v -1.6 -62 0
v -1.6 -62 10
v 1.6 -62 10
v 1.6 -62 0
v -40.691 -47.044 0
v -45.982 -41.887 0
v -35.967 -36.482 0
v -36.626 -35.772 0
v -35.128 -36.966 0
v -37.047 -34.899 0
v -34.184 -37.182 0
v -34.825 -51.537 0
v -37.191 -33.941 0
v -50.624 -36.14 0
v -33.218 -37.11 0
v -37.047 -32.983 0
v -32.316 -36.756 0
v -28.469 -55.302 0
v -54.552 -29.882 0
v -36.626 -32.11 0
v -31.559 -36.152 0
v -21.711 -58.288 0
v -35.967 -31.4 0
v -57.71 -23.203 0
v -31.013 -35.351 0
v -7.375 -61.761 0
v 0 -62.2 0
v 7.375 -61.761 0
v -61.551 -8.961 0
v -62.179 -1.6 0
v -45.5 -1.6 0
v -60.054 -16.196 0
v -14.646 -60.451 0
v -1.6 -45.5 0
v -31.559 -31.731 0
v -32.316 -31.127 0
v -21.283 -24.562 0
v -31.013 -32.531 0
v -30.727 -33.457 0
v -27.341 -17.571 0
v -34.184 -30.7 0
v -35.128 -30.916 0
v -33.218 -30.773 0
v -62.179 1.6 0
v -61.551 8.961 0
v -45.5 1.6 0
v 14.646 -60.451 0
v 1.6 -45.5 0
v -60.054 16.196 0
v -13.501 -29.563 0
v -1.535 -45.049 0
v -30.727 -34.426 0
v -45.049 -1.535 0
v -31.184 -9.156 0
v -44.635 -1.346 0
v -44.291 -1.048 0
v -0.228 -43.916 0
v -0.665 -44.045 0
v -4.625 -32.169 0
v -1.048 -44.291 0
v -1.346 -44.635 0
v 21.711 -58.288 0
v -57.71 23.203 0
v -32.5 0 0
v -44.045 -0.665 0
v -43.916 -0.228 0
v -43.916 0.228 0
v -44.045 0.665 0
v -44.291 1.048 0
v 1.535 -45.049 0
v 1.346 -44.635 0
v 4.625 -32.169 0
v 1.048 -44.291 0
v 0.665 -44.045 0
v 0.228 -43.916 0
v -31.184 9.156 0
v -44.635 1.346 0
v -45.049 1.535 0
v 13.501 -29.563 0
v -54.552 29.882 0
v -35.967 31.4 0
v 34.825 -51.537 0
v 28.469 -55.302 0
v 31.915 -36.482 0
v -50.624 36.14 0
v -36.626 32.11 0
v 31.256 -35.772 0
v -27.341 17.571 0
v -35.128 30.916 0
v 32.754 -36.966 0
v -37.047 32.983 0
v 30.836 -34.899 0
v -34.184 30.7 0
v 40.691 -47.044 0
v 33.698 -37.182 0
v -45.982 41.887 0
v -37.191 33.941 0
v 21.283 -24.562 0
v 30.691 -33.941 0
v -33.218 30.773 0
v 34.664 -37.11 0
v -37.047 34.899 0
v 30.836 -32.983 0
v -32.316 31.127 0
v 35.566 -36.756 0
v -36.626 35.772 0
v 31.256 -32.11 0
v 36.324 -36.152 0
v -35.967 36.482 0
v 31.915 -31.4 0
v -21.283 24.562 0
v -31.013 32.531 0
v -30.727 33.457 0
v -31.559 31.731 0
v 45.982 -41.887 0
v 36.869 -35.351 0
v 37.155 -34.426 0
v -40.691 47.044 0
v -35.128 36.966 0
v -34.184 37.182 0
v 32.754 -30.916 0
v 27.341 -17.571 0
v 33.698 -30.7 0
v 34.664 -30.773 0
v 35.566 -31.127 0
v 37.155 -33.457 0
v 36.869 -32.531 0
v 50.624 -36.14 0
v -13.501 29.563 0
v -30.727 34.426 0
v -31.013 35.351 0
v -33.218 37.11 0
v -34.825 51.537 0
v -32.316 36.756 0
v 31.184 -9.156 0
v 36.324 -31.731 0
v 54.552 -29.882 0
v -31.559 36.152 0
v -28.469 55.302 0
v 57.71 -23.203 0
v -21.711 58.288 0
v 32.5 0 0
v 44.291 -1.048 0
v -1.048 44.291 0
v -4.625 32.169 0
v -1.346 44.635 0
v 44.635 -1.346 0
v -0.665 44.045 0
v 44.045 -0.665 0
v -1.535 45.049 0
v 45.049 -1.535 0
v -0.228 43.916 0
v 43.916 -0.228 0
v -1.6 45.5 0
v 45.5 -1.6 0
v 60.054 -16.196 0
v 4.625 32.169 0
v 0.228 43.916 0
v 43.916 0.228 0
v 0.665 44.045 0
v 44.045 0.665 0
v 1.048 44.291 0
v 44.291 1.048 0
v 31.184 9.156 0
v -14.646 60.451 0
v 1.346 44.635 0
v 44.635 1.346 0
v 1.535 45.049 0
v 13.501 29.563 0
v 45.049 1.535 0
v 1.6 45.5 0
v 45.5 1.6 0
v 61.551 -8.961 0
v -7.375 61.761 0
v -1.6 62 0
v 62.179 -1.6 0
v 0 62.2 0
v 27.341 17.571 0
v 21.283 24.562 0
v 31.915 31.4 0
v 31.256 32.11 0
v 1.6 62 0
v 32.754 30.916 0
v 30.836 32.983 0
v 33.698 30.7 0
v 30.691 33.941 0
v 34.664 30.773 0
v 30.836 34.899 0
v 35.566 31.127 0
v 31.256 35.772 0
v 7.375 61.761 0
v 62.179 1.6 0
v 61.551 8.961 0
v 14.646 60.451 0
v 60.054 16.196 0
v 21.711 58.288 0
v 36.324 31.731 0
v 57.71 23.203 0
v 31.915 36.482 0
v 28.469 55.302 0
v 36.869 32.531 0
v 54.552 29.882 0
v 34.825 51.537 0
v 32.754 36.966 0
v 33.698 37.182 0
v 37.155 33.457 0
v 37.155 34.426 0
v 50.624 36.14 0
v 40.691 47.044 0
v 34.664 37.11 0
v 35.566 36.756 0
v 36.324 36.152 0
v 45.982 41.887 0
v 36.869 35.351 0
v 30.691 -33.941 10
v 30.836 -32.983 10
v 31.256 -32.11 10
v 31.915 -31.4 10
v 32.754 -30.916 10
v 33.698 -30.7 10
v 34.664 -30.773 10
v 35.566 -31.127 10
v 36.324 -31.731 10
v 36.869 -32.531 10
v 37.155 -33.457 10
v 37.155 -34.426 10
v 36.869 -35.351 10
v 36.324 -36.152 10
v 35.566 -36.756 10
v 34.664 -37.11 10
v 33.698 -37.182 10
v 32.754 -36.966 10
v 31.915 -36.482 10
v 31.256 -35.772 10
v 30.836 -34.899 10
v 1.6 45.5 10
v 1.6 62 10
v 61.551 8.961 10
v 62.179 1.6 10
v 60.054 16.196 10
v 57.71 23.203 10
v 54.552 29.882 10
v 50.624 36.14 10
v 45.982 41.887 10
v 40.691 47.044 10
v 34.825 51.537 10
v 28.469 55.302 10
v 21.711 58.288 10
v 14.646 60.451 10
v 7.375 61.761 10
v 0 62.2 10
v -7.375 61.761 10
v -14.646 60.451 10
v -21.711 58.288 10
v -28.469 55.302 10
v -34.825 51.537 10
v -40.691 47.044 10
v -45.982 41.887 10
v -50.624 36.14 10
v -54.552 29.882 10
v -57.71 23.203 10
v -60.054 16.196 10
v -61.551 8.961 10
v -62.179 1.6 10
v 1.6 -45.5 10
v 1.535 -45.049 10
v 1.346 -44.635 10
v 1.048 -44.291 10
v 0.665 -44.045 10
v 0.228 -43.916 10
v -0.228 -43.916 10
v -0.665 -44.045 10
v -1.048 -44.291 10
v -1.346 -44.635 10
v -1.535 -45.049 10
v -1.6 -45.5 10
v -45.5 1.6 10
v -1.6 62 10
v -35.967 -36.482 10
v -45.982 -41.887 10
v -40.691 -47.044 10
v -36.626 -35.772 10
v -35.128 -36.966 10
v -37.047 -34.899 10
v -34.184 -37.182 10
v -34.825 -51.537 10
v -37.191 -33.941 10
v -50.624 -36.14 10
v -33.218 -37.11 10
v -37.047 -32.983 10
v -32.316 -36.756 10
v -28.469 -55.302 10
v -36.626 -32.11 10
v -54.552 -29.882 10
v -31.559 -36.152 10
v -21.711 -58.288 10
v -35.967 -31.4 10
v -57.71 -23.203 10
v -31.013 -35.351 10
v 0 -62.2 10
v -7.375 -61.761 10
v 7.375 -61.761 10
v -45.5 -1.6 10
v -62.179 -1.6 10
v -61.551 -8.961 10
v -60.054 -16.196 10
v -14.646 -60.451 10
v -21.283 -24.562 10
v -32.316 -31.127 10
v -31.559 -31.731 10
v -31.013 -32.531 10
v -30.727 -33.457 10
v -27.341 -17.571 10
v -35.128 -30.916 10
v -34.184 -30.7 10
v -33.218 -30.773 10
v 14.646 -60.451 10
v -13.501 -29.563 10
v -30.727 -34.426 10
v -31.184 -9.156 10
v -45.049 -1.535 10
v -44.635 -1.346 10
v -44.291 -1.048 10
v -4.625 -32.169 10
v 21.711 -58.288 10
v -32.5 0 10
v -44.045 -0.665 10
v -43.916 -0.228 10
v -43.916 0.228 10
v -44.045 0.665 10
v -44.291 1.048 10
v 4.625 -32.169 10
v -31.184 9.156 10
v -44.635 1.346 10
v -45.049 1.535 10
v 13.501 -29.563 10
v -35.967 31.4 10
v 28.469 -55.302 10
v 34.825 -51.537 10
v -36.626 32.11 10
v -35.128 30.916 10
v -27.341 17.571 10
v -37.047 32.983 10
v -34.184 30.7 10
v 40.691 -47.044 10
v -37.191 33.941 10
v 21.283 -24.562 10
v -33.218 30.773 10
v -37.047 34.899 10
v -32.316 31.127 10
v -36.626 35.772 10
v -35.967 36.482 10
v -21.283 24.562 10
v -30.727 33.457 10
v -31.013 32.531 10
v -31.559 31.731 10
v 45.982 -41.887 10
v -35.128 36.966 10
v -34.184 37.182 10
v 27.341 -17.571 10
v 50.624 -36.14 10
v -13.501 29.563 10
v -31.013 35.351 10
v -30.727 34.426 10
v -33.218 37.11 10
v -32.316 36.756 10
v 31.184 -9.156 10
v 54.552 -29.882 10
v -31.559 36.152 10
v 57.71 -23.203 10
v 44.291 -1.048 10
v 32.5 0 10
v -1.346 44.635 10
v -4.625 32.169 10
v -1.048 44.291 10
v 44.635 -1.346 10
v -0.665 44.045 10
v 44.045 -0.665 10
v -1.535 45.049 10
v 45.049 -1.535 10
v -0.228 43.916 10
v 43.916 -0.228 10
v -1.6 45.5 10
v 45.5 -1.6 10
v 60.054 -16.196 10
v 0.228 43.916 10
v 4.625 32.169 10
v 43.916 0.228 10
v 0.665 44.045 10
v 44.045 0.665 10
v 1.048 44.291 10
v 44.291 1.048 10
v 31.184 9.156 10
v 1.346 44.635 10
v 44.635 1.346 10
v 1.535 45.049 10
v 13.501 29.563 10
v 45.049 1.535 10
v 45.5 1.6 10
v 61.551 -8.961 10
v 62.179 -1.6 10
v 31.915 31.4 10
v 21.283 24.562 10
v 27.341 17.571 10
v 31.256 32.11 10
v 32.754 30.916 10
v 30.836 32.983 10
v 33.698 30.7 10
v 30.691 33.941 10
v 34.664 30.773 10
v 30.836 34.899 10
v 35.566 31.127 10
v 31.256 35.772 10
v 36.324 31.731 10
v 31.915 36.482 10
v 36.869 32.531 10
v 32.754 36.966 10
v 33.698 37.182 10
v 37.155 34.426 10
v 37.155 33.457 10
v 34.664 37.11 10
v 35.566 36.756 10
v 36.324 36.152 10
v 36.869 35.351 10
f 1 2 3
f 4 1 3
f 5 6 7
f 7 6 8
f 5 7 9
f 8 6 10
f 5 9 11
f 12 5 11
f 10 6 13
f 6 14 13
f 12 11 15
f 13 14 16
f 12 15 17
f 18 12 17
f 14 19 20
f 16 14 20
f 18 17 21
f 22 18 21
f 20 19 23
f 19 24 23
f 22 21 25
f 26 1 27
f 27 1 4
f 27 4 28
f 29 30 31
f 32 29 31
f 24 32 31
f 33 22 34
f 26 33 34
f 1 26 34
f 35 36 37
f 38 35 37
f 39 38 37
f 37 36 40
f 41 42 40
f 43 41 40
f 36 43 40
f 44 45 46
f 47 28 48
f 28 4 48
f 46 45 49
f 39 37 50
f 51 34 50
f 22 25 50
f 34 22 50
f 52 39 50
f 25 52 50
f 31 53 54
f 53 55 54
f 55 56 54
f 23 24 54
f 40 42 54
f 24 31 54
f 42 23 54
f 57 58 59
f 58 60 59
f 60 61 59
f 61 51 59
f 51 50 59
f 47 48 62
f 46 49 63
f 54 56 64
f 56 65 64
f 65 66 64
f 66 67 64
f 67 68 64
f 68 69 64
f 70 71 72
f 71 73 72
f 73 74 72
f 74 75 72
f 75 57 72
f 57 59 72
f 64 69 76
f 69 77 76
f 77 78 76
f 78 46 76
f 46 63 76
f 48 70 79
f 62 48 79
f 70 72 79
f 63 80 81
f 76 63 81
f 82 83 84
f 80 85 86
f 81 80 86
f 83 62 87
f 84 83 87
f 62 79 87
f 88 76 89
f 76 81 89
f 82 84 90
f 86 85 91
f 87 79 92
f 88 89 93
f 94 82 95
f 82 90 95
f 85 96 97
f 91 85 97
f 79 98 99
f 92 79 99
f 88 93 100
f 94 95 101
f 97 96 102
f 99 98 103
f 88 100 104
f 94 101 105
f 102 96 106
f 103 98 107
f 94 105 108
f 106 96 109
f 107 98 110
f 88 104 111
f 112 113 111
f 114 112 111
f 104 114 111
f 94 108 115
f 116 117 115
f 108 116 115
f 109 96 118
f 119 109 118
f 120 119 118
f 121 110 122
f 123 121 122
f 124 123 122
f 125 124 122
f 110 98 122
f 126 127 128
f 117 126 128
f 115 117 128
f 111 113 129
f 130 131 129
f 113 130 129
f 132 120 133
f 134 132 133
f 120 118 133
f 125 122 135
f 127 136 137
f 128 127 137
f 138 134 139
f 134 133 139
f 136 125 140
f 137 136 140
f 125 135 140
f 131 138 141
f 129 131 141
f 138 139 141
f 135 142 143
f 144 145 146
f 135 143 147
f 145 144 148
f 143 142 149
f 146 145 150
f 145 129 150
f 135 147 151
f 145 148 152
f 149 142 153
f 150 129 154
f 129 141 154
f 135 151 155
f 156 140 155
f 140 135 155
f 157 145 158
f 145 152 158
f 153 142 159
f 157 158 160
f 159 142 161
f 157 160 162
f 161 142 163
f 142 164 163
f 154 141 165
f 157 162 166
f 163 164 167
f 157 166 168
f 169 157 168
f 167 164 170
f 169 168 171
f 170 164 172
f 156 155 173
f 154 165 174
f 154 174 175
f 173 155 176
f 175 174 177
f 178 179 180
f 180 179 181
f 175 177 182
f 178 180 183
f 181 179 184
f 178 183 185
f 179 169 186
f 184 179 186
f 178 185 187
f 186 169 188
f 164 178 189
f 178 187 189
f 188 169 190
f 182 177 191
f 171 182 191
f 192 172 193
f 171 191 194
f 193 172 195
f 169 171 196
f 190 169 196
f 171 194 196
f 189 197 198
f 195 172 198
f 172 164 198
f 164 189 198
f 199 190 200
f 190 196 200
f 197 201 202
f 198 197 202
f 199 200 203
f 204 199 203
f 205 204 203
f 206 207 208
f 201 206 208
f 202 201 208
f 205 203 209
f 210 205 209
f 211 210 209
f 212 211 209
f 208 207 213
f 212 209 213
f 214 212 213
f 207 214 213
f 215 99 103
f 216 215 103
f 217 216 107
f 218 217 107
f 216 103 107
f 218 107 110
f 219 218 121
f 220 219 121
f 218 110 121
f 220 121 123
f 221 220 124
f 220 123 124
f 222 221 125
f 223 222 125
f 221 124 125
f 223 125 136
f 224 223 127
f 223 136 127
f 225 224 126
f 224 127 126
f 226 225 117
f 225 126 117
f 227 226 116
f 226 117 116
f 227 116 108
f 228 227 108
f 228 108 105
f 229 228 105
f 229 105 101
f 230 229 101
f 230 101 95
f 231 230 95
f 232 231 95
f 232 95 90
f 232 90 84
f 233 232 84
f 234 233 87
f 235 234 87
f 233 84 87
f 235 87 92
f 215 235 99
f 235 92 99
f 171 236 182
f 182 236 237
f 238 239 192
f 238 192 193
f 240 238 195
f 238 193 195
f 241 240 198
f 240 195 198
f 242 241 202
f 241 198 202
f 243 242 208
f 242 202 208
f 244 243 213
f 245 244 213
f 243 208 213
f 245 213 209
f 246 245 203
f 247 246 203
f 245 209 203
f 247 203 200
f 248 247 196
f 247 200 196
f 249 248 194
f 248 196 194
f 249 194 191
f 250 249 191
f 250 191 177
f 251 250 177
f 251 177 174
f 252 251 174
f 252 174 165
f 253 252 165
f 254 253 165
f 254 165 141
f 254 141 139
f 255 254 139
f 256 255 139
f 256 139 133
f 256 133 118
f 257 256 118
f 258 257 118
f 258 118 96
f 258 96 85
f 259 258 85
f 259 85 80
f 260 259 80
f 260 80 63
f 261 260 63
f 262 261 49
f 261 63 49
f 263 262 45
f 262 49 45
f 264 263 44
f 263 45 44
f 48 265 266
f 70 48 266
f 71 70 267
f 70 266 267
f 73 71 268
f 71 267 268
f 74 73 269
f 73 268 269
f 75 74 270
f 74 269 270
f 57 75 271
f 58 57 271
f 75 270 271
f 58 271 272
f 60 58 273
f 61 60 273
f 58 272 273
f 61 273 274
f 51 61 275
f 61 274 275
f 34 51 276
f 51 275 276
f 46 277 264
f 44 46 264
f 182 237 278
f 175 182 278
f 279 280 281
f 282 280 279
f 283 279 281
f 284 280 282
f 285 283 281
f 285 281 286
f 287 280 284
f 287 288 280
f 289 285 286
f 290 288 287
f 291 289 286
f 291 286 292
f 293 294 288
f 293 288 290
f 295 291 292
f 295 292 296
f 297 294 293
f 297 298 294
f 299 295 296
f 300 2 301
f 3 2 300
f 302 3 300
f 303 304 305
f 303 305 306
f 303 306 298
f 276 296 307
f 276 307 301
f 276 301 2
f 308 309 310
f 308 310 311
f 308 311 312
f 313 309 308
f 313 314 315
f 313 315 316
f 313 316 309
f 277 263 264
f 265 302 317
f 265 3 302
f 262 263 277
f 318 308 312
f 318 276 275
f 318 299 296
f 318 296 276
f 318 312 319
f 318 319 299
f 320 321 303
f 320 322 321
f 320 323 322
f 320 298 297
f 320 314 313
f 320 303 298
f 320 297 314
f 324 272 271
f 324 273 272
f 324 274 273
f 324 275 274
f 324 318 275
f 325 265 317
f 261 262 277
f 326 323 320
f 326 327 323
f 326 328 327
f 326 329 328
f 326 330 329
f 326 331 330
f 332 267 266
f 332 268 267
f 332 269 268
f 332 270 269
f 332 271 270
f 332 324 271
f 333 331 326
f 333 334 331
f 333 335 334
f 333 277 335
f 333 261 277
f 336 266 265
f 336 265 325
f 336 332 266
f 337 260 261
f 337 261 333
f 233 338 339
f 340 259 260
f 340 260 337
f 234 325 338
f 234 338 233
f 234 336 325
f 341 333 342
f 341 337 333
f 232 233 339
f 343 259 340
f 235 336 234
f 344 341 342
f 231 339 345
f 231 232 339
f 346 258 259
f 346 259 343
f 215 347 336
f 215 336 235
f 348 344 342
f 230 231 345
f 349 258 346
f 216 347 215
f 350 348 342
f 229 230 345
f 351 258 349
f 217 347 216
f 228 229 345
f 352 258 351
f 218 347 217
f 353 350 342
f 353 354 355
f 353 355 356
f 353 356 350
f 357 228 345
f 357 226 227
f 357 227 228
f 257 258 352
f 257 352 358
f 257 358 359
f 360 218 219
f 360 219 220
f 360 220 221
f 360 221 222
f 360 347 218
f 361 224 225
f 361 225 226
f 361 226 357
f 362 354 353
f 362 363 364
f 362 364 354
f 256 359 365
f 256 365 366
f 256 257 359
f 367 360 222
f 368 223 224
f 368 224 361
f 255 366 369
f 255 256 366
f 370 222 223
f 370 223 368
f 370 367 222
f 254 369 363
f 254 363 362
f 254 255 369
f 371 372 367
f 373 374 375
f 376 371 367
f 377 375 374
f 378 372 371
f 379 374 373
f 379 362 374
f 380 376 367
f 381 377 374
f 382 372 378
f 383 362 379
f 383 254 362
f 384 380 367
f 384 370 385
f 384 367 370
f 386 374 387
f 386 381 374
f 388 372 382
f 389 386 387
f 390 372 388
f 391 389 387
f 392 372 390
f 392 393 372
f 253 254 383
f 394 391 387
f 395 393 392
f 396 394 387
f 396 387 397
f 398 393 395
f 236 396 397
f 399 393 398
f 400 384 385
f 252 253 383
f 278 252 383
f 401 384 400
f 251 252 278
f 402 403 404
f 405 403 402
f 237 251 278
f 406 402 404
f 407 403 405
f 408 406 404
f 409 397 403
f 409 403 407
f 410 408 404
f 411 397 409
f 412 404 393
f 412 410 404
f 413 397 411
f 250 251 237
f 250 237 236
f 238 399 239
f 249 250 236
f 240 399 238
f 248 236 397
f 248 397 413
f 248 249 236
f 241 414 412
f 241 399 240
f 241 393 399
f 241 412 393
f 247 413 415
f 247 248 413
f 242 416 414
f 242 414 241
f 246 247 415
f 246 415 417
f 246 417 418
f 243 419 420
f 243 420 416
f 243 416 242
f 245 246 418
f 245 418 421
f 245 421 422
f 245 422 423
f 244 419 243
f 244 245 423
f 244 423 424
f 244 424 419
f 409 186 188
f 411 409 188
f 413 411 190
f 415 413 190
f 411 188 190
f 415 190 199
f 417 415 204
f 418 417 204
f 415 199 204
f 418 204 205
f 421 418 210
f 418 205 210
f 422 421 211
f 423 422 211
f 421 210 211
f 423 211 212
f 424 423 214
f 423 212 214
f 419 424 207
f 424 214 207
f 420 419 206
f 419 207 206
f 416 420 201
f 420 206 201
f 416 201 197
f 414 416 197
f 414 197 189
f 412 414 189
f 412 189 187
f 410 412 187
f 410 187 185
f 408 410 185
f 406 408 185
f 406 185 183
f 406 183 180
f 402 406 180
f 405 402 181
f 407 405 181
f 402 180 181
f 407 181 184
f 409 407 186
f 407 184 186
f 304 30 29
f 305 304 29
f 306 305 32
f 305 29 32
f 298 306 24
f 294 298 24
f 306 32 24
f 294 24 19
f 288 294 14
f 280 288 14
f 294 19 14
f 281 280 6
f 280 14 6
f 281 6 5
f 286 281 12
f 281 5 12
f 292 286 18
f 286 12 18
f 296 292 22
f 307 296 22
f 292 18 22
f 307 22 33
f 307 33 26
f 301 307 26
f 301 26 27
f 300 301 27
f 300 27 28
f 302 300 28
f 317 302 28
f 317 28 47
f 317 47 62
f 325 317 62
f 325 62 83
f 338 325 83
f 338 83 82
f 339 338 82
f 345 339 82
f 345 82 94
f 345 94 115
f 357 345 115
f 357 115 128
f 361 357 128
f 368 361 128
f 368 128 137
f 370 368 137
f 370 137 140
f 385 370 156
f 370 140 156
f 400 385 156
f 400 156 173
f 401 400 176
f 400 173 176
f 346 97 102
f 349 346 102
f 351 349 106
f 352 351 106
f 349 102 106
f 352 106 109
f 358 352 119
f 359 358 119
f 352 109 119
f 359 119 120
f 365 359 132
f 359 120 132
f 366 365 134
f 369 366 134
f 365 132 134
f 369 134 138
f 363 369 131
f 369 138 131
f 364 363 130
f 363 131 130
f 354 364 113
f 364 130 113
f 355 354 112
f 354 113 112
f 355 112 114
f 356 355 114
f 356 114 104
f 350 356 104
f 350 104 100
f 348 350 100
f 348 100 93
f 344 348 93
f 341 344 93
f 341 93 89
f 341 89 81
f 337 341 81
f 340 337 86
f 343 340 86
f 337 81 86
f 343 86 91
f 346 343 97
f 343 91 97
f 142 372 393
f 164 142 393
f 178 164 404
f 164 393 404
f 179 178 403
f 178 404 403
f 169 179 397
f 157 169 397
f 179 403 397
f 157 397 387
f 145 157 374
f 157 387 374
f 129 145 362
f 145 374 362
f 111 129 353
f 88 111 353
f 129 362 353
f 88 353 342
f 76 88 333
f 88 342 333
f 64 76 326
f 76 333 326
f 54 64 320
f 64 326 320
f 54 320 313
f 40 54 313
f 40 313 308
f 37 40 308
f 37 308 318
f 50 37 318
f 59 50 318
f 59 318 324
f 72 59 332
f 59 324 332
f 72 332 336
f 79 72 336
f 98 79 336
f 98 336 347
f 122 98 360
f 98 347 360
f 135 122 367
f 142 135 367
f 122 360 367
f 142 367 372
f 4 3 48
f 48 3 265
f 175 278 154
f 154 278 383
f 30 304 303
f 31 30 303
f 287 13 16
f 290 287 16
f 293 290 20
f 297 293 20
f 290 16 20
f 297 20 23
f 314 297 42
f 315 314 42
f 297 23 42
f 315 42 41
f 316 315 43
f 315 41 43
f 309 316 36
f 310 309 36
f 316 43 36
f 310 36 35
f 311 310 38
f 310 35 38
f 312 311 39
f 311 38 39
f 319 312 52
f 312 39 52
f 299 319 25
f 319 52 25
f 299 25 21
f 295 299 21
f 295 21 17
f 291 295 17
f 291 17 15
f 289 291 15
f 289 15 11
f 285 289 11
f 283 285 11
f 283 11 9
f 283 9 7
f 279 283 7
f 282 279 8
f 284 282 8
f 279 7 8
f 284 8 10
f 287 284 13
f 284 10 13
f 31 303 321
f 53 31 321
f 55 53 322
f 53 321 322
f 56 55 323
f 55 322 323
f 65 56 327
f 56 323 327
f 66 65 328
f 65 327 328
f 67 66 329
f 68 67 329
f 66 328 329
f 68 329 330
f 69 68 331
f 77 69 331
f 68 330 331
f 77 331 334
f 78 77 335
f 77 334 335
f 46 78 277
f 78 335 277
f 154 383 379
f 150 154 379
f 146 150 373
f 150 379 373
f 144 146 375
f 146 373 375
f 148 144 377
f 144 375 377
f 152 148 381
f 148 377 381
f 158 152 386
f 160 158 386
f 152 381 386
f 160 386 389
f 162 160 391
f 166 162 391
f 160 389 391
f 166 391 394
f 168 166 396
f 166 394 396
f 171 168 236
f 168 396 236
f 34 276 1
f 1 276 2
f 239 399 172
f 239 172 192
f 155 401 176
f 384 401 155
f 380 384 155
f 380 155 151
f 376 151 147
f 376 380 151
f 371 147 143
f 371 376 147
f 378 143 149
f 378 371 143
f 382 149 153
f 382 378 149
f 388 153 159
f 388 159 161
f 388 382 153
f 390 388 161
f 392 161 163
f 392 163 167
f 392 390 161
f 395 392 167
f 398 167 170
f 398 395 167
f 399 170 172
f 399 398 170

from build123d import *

# Parameters (mm, degrees)
IZIM1_R                     = 62.2
Y_KSEKLIK_EKSTR_ZYON1_DEPTH = 10
IZIM2_R                     = 32.5
KES_EKSTR_ZYON1_DEPTH       = 10
KES_EKSTR_ZYON2_DEPTH       = 10
IZIM5_R                     = 3.25
KES_EKSTR_ZYON3_DEPTH       = 10


with BuildPart() as part:
    # Çizim1 → Yükseklik-Ekstrüzyon1 (new body)
    with BuildSketch(Plane.XY):
        Circle(IZIM1_R)
    extrude(amount=Y_KSEKLIK_EKSTR_ZYON1_DEPTH)

    # Çizim2 → Kes-Ekstrüzyon1 (cut)
    with BuildSketch(Plane.XY.offset(10)):
        Circle(IZIM2_R)
    extrude(amount=-KES_EKSTR_ZYON1_DEPTH, mode=Mode.SUBTRACT)

    # Çizim4 → Kes-Ekstrüzyon2 (cut)
    with BuildSketch(Plane.XY.offset(10)):
        with BuildLine():
            Line((1.6, -62), (1.6, -45.5))
            ThreePointArc((1.6, -45.5), (0, -43.9), (-1.6, -45.5))
            Line((-1.6, -45.5), (-1.6, -62))
            Line((-1.6, -62), (1.6, -62))
        make_face()
        with BuildLine():
            Line((-1.6, 62), (-1.6, 45.5))
            ThreePointArc((-1.6, 45.5), (0, 43.9), (1.6, 45.5))
            Line((1.6, 45.5), (1.6, 62))
            Line((1.6, 62), (-1.6, 62))
        make_face()
        with BuildLine():
            Line((62.2, 1.6), (62.2, -1.6))
            Line((62.2, -1.6), (45.5, -1.6))
            ThreePointArc((45.5, -1.6), (43.9, 0), (45.5, 1.6))
            Line((45.5, 1.6), (62.2, 1.6))
        make_face()
        with BuildLine():
            Line((-62.2, -1.6), (-45.5, -1.6))
            ThreePointArc((-45.5, -1.6), (-43.9, 0), (-45.5, 1.6))
            Line((-45.5, 1.6), (-62.2, 1.6))
            Line((-62.2, 1.6), (-62.2, -1.6))
        make_face()
    extrude(amount=-KES_EKSTR_ZYON2_DEPTH, mode=Mode.SUBTRACT)

    # Çizim5 → Kes-Ekstrüzyon3 (cut)
    with BuildSketch(Plane(origin=(0, 0, 0), x_dir=(-1, 0, 0), z_dir=(0, 0, -1))):
        with Locations((-33.941125497, 33.941125497)):
            Circle(IZIM5_R)
        with Locations((33.941125497, 33.941125497)):
            Circle(IZIM5_R)
        with Locations((33.941125497, -33.941125497)):
            Circle(IZIM5_R)
        with Locations((-33.941125497, -33.941125497)):
            Circle(IZIM5_R)
    extrude(amount=-KES_EKSTR_ZYON3_DEPTH, mode=Mode.SUBTRACT)


solid = part.part
